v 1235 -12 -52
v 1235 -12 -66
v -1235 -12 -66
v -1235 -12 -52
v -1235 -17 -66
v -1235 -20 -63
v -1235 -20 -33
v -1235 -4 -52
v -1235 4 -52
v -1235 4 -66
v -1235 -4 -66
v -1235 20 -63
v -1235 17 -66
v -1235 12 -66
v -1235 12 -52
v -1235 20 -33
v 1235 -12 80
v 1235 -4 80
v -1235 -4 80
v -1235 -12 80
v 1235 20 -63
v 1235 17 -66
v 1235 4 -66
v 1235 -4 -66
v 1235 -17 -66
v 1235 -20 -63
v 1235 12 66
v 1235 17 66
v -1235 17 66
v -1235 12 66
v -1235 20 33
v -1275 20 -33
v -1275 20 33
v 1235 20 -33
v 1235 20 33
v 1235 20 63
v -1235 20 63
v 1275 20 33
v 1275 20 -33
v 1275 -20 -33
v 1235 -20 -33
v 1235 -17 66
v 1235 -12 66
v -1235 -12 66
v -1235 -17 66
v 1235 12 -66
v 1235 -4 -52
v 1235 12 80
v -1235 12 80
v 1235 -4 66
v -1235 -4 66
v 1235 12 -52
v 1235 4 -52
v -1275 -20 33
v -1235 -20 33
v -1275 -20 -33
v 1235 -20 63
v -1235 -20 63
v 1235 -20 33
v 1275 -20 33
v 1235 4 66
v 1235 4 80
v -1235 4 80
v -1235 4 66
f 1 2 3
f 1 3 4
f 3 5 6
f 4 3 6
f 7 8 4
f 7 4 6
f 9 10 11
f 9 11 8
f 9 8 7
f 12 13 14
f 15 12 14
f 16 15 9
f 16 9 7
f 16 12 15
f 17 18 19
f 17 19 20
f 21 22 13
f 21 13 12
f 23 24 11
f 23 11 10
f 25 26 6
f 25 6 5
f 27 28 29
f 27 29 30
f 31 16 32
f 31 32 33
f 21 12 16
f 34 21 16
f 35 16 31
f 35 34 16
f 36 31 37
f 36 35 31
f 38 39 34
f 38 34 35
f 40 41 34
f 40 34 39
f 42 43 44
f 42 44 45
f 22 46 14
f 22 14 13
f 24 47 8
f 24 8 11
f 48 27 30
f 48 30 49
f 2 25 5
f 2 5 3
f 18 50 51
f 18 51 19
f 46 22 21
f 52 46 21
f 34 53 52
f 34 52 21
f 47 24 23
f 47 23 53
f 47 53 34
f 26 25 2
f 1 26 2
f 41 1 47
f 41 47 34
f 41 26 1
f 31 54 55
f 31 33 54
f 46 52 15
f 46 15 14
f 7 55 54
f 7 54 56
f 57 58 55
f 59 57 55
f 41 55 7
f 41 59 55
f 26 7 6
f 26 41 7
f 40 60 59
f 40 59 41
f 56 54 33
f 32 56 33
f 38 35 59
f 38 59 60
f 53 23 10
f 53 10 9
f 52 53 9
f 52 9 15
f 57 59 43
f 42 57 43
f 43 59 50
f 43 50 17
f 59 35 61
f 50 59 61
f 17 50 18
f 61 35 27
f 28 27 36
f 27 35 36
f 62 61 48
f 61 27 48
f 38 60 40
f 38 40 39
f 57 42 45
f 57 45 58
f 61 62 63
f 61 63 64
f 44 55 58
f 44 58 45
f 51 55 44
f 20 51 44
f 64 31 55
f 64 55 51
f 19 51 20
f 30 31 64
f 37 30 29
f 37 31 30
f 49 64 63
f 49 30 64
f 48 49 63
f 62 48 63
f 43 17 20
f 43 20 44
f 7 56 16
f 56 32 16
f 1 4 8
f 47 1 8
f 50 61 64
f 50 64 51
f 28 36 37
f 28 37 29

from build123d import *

# Parameters (mm, degrees)
F1_W     = 40
F1_H     = 33
F3_DEPTH = 1275
F2_W     = 80
F2_H     = 100
F4_DEPTH = 25


with BuildPart() as f3:
    # F1 (on Right) → F3 (new body, symmetric)
    with BuildSketch(Plane.YZ):
        Polygon((20, 33), (20, 63), (17, 66), (12, 66), (12, 80), (4, 80), (4, 66), (-4, 66), (-4, 80), (-12, 80), (-12, 66), (-17, 66), (-20, 63), (-20, 33), align=None)
        with Locations((0, 16.5)):
            Rectangle(F1_W, F1_H)
        with Locations((0, -16.5)):
            Rectangle(F1_W, F1_H)
        Polygon((20, -63), (20, -33), (-20, -33), (-20, -63), (-17, -66), (-12, -66), (-12, -52), (-4, -52), (-4, -66), (4, -66), (4, -52), (12, -52), (12, -66), (17, -66), align=None)
    extrude(amount=F3_DEPTH, both=True)

    # F2 (on Front) → F4 (cut, symmetric)
    with BuildSketch(Plane.XZ):
        with Locations((-1275, 83)):
            Rectangle(F2_W, F2_H)
        with Locations((-1275, -83)):
            Rectangle(F2_W, F2_H)
        with Locations((1275, 83)):
            Rectangle(F2_W, F2_H)
        with Locations((1275, -83)):
            Rectangle(F2_W, F2_H)
    extrude(amount=F4_DEPTH, both=True, mode=Mode.SUBTRACT)


solid = f3.part
